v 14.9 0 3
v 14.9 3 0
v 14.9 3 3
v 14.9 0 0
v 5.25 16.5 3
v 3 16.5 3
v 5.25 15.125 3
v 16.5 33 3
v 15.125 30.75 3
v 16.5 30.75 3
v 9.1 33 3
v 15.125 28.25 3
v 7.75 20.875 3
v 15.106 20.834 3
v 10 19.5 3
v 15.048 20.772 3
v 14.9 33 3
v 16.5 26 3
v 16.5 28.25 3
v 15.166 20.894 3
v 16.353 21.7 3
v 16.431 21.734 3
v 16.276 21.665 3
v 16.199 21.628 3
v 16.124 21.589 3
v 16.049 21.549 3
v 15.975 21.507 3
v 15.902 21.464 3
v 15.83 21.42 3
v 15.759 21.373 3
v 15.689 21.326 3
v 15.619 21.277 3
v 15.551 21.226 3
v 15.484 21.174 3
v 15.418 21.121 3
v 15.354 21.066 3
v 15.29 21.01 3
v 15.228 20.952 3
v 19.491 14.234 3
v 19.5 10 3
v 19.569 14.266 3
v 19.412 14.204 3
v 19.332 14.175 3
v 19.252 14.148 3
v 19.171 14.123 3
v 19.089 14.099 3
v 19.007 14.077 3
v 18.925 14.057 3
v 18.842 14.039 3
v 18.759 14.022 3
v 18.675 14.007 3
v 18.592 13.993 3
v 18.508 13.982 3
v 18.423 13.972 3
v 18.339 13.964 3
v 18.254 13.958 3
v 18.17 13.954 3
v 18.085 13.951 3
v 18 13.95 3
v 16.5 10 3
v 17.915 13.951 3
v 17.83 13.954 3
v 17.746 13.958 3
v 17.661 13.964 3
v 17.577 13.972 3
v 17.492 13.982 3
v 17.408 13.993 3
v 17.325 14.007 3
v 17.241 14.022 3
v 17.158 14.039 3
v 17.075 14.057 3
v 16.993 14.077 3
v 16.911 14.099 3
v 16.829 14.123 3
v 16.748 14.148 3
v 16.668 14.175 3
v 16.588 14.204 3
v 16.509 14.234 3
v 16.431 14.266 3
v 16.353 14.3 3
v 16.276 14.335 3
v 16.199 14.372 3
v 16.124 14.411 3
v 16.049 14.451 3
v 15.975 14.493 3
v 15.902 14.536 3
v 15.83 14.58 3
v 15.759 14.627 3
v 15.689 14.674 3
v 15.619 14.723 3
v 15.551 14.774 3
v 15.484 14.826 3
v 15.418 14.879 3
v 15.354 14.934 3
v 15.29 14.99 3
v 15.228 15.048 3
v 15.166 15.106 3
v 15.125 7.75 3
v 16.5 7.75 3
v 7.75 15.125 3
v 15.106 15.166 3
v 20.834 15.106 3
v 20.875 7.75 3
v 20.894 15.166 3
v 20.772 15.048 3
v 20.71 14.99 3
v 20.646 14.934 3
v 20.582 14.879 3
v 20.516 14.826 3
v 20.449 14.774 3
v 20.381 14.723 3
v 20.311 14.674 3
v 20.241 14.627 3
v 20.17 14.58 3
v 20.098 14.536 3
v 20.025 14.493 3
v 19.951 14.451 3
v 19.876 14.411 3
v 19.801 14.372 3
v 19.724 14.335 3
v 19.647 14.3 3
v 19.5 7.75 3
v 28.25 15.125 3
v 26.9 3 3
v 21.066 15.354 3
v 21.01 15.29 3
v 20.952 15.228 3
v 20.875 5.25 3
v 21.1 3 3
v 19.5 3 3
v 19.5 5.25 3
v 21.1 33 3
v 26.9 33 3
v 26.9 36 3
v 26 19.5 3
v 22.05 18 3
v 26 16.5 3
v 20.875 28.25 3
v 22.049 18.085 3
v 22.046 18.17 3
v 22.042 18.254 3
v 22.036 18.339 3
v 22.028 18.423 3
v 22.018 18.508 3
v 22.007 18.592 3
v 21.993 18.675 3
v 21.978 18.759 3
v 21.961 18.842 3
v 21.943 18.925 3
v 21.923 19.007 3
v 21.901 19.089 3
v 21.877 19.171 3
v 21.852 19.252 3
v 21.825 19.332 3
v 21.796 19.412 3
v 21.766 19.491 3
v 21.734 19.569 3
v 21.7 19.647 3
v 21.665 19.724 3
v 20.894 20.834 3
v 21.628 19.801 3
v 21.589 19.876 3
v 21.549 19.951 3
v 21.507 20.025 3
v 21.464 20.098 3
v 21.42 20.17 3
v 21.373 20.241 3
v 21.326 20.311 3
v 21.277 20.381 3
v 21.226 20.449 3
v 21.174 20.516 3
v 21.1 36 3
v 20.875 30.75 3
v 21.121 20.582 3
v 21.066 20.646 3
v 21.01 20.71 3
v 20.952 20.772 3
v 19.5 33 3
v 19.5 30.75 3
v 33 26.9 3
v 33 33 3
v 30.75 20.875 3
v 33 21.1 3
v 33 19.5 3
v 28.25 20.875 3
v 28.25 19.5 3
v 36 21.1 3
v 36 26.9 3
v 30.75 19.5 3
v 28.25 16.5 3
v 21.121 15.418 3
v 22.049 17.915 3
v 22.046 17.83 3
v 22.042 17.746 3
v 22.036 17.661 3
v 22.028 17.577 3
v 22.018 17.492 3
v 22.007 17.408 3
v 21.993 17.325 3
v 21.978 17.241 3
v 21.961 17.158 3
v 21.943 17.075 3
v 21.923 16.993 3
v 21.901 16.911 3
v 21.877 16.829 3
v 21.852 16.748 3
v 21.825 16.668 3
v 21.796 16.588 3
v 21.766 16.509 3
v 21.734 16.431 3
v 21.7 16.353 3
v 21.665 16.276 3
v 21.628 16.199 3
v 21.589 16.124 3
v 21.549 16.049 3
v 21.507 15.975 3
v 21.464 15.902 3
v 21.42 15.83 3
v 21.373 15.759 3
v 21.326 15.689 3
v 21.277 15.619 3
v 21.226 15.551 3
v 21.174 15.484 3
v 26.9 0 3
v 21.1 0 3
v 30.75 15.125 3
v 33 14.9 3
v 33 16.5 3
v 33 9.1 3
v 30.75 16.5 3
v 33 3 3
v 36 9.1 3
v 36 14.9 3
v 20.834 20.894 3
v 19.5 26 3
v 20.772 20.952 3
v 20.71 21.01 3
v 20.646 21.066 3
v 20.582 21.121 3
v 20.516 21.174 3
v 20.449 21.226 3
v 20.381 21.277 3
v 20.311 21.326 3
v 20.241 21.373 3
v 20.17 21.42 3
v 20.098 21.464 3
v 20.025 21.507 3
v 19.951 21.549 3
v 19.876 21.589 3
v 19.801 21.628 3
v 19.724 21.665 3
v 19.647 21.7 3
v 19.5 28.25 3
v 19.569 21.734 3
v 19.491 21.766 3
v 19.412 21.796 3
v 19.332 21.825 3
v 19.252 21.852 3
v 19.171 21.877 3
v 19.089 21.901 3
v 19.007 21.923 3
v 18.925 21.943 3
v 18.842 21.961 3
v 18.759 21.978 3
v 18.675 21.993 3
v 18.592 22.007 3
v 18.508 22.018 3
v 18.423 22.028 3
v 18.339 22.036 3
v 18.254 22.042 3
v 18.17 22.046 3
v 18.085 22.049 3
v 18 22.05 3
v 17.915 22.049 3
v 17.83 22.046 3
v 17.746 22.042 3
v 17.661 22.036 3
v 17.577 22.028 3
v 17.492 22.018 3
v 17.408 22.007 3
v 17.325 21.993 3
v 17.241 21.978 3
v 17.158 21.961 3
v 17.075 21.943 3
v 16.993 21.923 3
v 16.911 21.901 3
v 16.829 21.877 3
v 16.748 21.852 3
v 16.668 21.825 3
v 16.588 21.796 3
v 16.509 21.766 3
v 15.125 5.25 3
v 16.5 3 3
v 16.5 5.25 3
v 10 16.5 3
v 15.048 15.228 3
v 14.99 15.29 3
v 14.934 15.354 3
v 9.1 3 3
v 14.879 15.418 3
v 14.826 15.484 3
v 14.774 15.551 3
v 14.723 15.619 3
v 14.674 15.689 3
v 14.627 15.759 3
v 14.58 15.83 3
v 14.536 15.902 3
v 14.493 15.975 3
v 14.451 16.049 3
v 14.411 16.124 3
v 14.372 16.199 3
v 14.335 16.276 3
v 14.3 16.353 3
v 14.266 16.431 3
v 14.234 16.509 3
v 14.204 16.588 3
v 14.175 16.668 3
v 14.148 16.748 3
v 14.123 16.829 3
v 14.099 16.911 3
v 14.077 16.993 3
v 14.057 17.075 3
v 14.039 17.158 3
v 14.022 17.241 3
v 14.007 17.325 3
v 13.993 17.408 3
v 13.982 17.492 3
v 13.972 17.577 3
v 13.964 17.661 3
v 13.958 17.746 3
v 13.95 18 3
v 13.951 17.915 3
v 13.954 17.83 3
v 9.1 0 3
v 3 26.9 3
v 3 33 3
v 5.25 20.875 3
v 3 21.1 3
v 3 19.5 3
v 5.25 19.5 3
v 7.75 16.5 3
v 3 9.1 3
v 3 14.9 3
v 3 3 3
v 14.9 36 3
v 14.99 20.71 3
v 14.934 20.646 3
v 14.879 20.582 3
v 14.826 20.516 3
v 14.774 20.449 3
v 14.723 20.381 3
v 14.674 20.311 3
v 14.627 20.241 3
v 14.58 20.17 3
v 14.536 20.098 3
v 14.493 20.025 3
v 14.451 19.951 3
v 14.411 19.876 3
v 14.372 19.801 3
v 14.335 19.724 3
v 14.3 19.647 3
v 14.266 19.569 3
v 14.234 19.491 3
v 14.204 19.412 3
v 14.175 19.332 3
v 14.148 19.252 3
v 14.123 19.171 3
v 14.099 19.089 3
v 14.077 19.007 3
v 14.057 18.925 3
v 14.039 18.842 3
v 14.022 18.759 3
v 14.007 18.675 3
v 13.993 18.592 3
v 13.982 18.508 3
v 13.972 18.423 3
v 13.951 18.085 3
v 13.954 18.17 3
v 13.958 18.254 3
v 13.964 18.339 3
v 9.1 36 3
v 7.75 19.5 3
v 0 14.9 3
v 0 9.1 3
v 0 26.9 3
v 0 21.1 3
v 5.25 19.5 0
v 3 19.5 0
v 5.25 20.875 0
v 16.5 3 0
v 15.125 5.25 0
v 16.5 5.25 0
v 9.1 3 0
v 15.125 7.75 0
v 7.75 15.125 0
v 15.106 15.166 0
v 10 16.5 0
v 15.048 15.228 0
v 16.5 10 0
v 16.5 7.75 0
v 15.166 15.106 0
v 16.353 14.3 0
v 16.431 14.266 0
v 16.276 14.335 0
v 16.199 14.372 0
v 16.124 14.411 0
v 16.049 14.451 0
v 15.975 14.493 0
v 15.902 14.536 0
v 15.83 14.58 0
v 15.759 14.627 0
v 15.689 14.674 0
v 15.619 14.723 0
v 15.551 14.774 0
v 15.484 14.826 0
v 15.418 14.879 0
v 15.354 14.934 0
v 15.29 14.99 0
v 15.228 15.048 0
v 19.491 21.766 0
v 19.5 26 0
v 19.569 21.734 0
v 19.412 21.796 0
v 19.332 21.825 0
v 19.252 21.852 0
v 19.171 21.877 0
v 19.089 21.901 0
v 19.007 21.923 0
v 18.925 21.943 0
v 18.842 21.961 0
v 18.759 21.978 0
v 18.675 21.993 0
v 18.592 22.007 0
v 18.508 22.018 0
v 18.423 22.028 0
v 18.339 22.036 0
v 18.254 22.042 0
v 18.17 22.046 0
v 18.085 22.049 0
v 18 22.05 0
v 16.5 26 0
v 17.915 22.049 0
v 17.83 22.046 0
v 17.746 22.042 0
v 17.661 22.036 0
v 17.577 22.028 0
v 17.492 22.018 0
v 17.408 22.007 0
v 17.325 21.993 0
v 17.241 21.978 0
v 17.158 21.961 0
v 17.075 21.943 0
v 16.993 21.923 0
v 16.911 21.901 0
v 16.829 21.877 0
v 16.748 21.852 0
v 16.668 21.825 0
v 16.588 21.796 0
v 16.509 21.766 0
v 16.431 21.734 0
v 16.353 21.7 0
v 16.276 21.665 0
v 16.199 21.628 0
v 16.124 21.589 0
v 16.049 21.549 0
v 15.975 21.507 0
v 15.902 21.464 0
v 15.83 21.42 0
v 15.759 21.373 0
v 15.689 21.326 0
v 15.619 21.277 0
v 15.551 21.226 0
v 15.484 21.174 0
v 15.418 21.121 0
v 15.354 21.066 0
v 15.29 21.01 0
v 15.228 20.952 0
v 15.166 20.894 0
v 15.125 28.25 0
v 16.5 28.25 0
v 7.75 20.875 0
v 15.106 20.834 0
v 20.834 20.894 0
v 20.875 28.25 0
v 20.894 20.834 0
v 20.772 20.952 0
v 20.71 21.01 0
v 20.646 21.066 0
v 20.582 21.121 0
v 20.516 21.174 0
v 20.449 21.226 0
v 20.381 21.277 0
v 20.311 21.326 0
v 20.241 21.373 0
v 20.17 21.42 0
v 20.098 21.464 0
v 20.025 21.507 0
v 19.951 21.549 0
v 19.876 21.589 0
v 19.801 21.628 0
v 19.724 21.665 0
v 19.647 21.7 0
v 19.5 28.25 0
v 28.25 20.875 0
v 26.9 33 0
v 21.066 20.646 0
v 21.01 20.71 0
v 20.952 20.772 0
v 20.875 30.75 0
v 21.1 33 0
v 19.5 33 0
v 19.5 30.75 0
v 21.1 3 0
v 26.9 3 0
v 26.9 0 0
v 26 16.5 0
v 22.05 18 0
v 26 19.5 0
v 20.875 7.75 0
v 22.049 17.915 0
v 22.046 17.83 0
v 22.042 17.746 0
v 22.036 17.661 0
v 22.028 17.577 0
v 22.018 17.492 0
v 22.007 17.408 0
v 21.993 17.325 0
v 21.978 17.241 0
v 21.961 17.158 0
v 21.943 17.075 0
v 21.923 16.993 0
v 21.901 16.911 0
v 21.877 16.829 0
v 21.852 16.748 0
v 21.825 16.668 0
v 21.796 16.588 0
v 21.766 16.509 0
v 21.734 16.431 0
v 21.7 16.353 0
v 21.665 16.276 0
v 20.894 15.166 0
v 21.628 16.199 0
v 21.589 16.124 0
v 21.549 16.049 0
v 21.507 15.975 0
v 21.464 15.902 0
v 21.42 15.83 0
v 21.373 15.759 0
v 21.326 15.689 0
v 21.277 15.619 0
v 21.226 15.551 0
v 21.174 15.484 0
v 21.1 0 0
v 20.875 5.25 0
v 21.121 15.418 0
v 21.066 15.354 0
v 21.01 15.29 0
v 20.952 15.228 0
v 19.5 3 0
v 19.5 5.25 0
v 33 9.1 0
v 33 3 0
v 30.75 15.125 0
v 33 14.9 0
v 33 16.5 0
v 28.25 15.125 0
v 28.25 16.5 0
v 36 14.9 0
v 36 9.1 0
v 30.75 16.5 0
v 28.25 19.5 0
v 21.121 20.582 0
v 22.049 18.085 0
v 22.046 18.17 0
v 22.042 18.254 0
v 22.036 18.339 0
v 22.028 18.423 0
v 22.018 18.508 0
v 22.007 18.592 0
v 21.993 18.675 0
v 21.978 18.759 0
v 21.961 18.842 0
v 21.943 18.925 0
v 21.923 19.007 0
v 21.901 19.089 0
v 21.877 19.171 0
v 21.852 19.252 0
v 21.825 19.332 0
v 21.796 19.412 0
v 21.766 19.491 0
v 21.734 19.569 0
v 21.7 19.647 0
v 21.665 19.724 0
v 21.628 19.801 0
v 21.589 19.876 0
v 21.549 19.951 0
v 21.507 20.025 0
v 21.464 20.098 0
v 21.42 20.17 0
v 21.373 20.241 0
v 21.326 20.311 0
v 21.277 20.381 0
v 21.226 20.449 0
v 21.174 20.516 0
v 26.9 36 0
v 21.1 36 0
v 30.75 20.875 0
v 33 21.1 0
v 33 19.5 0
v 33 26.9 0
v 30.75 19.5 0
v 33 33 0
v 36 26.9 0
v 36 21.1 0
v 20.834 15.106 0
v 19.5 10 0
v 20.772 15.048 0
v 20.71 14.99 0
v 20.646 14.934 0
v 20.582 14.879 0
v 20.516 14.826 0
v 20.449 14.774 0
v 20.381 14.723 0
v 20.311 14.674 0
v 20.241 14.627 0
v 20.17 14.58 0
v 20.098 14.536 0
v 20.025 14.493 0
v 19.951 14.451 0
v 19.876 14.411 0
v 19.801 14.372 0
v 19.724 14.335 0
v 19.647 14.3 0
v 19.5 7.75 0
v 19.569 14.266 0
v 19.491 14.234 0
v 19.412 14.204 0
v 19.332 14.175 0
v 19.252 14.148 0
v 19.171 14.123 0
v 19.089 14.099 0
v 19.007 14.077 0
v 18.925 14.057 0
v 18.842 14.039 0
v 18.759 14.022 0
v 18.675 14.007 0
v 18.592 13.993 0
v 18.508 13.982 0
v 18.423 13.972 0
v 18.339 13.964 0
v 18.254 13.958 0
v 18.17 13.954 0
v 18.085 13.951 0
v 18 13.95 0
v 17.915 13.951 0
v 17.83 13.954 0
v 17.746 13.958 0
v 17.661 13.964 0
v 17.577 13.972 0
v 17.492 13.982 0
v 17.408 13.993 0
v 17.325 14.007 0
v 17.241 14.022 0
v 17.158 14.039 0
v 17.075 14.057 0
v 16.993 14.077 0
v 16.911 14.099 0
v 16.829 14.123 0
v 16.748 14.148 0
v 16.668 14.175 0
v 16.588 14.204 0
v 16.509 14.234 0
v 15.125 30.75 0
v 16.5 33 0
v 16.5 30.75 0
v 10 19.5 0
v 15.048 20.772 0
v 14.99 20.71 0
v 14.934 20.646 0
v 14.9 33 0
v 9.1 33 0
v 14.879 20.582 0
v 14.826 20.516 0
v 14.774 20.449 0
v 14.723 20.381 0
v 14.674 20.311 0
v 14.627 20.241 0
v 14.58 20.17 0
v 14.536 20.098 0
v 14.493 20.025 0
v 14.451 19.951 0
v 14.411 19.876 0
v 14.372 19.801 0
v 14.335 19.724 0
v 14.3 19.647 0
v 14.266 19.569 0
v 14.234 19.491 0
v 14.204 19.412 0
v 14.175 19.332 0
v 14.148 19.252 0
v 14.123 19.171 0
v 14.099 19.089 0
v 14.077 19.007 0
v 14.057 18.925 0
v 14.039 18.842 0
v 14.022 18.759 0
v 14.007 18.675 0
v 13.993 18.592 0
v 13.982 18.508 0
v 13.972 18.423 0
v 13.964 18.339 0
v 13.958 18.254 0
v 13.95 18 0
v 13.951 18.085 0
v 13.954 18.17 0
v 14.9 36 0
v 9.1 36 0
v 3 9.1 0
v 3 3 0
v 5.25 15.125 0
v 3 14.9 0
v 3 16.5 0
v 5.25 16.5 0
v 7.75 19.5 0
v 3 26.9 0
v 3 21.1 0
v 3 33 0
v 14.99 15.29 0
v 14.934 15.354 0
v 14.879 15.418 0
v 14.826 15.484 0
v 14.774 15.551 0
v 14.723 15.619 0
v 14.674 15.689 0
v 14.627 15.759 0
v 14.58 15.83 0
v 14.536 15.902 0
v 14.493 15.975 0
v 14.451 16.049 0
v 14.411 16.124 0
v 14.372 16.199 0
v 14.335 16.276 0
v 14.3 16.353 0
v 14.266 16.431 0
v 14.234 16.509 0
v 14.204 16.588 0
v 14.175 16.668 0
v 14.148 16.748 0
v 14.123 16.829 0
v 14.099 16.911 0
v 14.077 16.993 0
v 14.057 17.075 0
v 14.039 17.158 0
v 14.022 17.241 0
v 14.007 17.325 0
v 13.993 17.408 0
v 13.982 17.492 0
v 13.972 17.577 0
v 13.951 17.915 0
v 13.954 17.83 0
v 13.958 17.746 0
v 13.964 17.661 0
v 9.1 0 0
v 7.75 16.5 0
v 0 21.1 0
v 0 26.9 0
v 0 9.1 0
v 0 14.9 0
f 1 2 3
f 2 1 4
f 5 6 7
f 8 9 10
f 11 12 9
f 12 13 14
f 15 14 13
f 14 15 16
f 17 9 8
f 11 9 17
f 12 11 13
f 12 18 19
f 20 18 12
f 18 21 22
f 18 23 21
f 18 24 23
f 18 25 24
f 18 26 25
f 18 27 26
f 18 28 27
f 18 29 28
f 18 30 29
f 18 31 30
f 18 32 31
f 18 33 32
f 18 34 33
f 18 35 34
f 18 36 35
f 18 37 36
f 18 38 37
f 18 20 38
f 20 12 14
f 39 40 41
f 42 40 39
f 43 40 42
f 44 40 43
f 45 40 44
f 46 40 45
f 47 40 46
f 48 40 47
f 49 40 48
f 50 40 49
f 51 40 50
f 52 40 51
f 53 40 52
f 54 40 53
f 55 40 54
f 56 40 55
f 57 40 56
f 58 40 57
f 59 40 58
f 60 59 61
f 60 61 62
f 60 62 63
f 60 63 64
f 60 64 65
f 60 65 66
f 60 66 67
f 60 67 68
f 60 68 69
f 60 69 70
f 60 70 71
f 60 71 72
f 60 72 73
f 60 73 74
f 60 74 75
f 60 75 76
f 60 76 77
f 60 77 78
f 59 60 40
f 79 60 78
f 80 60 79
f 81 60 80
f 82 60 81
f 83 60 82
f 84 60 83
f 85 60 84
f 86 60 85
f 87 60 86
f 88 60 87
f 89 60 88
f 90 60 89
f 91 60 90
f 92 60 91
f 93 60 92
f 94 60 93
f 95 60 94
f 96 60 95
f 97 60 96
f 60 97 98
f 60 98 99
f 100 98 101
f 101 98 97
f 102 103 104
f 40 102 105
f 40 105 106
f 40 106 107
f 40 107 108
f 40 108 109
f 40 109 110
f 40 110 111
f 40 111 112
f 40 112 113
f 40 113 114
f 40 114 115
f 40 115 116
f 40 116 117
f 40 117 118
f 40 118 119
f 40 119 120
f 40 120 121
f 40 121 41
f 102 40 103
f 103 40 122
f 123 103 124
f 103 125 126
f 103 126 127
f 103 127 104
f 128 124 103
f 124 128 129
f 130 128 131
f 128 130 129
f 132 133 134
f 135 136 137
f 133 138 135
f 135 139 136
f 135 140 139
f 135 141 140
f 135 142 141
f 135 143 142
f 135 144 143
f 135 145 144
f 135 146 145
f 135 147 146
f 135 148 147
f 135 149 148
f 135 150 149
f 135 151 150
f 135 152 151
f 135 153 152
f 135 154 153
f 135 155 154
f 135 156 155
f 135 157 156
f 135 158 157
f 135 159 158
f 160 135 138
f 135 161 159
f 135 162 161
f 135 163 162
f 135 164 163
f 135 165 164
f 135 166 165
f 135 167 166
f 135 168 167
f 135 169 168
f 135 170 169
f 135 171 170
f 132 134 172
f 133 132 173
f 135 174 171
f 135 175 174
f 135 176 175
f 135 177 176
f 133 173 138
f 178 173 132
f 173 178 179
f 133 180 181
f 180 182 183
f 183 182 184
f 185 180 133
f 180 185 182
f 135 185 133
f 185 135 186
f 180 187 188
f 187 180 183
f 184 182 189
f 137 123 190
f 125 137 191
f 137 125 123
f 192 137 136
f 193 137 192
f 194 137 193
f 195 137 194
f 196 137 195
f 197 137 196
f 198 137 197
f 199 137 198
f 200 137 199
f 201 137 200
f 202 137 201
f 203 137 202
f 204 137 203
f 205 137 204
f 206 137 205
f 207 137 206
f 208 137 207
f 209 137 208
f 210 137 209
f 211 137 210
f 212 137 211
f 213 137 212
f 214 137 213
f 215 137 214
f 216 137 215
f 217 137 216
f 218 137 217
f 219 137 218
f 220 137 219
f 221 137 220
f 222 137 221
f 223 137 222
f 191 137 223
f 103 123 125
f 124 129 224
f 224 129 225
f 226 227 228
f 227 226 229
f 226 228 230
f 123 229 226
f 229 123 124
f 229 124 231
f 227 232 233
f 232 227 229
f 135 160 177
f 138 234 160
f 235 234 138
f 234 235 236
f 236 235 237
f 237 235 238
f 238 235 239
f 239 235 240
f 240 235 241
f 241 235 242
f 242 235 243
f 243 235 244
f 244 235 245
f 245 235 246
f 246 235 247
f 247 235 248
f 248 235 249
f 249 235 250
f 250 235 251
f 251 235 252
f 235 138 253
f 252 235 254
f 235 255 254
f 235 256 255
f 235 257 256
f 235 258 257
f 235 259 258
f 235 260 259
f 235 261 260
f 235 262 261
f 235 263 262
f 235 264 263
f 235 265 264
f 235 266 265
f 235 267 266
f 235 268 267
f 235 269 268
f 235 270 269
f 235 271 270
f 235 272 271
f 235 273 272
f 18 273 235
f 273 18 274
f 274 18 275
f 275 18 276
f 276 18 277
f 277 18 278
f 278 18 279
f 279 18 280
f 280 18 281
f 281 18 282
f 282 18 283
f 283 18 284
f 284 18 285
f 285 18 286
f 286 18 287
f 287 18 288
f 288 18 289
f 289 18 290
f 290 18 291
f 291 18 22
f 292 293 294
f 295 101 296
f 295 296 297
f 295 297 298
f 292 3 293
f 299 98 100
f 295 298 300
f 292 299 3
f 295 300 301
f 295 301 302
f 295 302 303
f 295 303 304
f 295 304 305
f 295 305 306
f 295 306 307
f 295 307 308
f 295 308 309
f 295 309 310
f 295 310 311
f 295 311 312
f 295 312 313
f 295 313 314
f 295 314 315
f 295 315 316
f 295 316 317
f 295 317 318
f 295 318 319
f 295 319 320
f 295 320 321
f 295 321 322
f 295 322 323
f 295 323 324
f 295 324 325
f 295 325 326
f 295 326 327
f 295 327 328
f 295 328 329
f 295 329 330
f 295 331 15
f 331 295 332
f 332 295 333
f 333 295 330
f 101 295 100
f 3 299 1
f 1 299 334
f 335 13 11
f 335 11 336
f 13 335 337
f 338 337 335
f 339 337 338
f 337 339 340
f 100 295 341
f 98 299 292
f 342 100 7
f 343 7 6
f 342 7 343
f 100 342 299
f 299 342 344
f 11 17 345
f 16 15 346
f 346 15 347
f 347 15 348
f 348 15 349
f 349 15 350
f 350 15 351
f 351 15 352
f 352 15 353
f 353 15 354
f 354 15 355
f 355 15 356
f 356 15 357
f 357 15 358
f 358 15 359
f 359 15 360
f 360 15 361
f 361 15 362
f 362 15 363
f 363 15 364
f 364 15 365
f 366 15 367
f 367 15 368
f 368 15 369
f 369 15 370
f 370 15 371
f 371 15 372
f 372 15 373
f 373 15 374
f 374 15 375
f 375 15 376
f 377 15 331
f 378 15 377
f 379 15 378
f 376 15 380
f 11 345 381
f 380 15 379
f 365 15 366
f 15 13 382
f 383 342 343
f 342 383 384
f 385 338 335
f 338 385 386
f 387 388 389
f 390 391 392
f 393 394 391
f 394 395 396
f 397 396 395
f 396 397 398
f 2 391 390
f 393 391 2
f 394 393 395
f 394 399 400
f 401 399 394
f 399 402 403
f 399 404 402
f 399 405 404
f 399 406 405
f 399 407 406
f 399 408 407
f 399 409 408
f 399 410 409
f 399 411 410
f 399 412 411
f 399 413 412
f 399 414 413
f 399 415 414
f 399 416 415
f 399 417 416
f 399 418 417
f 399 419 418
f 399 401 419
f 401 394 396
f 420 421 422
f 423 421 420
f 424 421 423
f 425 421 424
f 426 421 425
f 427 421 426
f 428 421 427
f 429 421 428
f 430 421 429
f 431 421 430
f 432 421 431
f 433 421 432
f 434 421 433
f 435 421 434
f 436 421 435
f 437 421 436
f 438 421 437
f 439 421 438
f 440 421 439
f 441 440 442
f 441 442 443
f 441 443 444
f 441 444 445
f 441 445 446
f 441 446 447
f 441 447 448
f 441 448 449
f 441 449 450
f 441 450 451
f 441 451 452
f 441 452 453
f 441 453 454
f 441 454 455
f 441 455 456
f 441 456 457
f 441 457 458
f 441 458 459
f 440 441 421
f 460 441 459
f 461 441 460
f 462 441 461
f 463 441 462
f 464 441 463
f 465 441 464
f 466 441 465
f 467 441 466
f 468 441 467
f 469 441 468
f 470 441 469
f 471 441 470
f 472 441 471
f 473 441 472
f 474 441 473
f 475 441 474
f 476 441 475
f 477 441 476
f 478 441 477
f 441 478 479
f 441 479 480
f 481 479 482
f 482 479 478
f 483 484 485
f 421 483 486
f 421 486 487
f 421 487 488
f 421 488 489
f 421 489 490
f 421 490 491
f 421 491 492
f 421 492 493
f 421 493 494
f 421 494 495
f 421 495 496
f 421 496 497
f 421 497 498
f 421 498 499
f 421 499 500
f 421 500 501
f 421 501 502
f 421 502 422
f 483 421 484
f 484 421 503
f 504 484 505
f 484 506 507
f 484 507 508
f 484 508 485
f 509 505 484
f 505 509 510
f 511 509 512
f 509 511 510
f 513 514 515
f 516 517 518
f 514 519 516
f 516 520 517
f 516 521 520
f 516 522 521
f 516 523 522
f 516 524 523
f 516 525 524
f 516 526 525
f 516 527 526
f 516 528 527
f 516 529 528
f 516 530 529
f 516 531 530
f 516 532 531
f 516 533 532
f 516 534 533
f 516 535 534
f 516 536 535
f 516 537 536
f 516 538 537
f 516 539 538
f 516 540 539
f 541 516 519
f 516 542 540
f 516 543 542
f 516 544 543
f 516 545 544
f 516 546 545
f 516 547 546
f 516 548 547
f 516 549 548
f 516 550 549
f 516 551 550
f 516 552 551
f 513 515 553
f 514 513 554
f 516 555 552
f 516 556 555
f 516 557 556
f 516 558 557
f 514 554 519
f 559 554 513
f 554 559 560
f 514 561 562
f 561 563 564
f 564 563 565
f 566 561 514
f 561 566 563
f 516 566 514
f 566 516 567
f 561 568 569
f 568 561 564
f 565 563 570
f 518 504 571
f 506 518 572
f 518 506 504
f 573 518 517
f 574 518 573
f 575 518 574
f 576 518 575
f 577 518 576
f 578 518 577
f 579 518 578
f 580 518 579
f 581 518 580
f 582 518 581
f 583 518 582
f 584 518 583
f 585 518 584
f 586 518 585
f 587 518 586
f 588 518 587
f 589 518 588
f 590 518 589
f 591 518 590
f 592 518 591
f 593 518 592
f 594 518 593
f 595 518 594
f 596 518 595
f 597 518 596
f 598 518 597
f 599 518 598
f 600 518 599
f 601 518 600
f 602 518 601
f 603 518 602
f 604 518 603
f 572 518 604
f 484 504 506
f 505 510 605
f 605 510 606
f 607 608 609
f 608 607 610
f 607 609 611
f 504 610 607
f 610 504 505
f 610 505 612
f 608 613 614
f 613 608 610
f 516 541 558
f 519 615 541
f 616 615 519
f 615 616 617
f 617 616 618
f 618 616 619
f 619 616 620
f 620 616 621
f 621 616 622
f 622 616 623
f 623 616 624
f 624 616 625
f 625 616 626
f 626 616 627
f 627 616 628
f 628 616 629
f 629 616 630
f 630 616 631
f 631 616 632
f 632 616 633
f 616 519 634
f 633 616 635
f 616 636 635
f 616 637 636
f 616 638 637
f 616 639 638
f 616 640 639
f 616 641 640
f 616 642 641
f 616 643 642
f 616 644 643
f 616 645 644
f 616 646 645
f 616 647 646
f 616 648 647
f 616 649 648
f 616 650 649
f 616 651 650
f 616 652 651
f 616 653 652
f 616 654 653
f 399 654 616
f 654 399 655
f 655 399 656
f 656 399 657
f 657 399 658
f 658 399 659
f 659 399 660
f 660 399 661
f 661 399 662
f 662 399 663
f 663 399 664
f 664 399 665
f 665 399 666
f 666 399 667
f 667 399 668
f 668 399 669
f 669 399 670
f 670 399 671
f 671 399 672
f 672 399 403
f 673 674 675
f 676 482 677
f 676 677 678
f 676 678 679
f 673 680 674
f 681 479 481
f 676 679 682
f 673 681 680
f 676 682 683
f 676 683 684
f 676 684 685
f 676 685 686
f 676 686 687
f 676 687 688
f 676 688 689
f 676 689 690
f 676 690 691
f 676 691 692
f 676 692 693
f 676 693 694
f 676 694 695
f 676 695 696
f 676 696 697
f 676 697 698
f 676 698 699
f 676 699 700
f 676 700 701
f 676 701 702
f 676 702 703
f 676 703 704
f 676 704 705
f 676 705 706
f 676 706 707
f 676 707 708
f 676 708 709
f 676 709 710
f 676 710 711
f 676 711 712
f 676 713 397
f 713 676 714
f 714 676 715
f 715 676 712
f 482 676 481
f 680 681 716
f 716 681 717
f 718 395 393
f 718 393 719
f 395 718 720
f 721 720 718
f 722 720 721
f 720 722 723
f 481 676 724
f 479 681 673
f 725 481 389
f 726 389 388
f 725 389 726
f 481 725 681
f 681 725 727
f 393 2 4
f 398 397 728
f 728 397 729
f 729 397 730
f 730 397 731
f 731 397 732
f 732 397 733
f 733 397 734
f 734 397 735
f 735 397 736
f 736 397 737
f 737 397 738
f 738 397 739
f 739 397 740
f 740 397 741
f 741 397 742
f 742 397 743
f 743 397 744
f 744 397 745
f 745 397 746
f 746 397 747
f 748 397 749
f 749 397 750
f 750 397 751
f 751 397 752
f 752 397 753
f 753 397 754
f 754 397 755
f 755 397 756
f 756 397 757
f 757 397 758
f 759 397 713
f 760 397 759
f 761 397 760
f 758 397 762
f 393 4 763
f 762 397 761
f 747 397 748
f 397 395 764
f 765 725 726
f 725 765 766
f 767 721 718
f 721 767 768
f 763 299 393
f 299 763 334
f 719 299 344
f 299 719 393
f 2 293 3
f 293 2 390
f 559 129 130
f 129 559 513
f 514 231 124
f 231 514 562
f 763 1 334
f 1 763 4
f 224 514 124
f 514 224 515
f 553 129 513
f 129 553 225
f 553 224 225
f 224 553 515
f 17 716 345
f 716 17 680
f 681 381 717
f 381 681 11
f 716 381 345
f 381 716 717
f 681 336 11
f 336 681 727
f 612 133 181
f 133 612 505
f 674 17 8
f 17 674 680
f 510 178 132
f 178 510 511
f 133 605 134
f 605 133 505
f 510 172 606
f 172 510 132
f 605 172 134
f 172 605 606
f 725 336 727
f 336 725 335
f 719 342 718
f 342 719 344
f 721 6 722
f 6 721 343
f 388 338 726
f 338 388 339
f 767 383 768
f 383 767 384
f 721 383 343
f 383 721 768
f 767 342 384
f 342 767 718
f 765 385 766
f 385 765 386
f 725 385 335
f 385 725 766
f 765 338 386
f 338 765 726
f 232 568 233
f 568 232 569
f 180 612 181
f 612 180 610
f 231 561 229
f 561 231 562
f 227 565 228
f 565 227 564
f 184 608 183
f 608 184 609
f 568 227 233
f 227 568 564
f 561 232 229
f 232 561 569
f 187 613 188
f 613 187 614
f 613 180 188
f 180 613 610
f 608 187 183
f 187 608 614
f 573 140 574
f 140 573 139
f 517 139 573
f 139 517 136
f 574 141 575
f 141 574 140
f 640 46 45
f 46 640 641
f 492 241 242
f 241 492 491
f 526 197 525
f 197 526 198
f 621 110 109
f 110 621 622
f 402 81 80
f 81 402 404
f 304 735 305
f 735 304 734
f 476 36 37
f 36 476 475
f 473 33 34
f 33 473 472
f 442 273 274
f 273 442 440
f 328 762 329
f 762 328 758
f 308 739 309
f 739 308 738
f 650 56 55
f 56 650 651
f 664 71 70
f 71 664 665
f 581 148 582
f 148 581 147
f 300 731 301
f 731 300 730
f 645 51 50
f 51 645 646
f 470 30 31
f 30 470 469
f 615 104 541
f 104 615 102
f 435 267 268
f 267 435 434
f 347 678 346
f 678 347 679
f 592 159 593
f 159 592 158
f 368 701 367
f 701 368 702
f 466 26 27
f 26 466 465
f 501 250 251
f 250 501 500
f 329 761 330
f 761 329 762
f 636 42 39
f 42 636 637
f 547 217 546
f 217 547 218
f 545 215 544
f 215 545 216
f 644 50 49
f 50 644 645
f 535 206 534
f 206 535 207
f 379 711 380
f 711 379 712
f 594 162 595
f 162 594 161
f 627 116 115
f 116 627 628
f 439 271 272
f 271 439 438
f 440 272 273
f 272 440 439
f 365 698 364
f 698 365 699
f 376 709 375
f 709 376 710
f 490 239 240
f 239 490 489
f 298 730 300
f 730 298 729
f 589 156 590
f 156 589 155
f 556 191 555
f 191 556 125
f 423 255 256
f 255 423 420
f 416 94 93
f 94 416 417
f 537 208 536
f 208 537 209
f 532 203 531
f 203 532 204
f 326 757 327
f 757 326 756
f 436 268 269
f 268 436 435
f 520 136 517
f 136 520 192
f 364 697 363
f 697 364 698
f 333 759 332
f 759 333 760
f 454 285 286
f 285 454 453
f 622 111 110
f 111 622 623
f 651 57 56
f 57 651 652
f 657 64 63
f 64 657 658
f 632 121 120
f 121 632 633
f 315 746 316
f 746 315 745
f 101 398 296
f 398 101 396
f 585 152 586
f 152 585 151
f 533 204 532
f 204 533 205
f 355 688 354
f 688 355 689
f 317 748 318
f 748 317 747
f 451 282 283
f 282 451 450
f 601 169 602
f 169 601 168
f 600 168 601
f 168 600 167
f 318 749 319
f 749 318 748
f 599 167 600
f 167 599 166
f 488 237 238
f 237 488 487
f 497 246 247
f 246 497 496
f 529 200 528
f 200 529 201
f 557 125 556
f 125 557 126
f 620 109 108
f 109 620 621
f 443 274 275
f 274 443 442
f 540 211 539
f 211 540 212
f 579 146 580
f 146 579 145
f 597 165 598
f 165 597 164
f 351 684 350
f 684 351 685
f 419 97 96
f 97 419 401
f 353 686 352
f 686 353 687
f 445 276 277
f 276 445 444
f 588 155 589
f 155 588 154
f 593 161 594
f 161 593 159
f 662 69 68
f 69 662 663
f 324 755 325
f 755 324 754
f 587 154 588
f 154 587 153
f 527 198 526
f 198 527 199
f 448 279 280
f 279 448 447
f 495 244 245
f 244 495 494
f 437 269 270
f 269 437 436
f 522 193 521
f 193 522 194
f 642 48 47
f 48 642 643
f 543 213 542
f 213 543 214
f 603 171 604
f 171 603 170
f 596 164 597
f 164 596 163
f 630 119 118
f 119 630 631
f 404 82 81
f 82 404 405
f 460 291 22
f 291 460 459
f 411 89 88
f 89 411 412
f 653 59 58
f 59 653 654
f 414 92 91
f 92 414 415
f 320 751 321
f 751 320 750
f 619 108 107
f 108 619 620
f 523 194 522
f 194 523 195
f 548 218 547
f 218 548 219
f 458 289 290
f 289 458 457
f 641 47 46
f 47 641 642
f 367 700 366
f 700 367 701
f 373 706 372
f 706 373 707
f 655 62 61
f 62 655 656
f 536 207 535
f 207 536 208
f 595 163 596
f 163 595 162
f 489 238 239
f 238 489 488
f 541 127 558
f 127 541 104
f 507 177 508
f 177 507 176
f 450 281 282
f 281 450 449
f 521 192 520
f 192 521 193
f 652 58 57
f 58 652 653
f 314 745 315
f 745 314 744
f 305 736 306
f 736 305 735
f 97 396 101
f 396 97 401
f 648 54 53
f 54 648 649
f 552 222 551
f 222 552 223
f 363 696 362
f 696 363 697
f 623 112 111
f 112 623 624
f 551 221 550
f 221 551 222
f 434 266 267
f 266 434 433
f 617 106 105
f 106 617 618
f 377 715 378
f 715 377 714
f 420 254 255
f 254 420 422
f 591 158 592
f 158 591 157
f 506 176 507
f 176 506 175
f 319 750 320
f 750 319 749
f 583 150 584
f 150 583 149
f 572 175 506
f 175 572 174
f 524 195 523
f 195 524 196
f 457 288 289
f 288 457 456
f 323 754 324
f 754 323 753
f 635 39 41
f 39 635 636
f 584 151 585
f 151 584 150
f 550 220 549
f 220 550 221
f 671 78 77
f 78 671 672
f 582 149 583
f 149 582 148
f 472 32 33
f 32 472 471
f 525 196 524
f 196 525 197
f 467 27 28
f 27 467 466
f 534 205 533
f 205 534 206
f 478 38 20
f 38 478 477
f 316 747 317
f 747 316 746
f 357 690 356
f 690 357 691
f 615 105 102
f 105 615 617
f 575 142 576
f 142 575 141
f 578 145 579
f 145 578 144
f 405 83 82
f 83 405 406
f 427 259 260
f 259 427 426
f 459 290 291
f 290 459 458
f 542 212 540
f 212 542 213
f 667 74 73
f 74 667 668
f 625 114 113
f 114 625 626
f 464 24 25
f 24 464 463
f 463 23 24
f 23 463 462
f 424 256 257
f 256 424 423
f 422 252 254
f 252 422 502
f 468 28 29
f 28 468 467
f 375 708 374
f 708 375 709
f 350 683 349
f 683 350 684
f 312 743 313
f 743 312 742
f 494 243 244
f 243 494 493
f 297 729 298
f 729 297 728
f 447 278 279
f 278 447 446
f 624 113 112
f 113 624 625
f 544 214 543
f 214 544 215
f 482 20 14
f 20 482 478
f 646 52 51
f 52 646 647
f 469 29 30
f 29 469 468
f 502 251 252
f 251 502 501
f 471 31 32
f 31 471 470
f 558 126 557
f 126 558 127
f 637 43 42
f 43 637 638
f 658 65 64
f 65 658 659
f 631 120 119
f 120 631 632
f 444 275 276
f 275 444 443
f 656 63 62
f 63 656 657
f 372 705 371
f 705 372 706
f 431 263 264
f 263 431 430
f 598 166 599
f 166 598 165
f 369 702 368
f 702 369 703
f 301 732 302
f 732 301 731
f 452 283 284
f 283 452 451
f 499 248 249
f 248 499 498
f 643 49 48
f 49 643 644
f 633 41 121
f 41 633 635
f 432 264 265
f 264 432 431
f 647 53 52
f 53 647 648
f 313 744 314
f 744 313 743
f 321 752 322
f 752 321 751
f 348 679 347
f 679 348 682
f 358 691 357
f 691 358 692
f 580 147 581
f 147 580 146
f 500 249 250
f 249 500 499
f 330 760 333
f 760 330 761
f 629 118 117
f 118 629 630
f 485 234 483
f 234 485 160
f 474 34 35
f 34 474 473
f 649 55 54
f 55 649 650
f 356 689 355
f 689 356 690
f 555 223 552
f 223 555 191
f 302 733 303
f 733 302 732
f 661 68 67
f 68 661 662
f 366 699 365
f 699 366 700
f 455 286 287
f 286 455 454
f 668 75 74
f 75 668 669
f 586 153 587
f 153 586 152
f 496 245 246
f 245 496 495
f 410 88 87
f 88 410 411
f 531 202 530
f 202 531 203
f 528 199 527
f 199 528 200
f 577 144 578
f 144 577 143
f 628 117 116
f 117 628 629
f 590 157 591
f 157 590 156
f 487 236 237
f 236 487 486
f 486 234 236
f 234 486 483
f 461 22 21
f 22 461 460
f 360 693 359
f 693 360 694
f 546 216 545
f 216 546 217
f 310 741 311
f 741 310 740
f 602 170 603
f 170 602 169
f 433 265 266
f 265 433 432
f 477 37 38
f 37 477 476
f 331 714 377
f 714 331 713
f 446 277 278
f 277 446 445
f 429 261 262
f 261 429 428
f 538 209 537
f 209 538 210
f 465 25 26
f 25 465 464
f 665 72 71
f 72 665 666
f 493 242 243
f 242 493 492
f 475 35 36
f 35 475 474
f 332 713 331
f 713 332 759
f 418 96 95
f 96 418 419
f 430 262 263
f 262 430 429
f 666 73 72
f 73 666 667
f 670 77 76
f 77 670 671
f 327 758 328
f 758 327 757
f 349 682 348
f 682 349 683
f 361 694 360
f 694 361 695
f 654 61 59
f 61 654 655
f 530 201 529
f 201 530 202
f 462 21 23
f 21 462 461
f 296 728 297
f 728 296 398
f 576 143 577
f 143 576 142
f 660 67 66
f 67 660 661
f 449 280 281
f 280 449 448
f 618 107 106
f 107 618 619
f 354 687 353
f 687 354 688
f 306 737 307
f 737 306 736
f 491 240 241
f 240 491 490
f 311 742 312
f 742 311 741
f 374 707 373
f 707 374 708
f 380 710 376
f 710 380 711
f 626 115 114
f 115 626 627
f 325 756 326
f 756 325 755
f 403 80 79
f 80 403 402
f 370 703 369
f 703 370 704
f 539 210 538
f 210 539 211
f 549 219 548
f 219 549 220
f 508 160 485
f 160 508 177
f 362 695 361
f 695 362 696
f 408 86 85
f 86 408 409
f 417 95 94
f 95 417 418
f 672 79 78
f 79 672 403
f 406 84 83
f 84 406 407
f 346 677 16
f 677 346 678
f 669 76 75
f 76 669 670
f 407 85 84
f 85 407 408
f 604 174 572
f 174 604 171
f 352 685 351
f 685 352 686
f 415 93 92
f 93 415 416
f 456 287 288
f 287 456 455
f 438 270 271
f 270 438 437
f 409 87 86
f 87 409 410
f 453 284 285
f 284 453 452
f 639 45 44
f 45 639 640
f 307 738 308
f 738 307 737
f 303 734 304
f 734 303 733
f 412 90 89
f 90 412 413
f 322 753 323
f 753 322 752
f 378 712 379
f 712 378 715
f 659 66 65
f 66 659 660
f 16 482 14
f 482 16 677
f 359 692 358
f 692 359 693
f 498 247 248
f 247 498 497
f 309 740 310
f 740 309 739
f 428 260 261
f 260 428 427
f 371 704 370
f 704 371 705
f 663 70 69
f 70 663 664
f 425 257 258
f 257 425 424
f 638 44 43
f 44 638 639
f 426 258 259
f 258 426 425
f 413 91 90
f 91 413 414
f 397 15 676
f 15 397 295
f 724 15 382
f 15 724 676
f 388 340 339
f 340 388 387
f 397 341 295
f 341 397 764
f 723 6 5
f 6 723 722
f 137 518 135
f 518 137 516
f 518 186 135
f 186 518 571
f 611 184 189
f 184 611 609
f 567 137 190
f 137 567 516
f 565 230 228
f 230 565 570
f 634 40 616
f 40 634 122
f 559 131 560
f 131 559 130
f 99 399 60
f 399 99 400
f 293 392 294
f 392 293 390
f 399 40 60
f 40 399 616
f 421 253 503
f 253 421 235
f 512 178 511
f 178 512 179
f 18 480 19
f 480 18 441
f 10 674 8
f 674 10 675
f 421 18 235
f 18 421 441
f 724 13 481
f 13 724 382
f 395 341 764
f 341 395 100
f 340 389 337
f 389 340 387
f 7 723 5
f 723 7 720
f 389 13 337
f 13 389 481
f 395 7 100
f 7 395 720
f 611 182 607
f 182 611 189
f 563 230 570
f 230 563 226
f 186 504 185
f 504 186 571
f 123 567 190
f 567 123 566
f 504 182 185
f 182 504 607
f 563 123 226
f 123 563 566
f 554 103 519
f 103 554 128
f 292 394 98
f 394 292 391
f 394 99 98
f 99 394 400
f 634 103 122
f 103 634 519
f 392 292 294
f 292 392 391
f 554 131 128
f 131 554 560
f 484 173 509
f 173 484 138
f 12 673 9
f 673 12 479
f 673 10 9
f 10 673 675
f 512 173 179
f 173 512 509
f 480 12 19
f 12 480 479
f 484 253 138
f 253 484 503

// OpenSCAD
side = 36;
lct = 3 ; //laser cut sheet thickness
tol = .1; //tolerance
t_length = 10;// length of t-slot screw
t_thick = 3;// diameter of t-slot screw
nut_dia = 5.75;// diameter of t-slot nut
nut_thick = 2.5;// thickness of t-slot nut
dia = 8.1; //diameter of center hole
rch = dia/2; //radius of center hole

difference(){
union(){
     translate([lct,lct,0])cube([side-2*lct,side-2*lct,lct]);  //the center cube
     for(x=[lct+6+tol:12:side-lct-1])translate([x,0,0])cube([6-2*tol,lct,lct]); //bottom
     for(x=[lct+6+tol:12:side-lct-1])translate([x,side-lct,0])cube([6-2*tol,lct,lct]); //top
     for(y=[lct+6+tol:12:side-lct-1])translate([0,y,0])cube([lct,6-2*tol,lct]); //left
     for(y=[lct+6+tol:12:side-lct-1])translate([side-lct,y,0])cube([lct,6-2*tol,lct]);  //right
        }
union(){
    translate([side/2,side/2,0])cylinder(lct,r1=rch,r2=rch,center=false,$fn=300);//center hole
    
    translate([0,lct+12+((6-t_thick)/2),0])cube([t_length,t_thick,lct]);//screw-hole left
    
    translate([side-t_length,lct+12+((6-t_thick)/2),0])cube([t_length,t_thick,lct]);//screw-hole right
    
    translate([lct+12+((6-t_thick)/2),0,0])cube([t_thick,t_length,lct]);//screw-hole bottom
    
    translate([lct+12+((6-t_thick)/2),side-t_length,0])cube([t_thick,t_length,lct]);//screw-hole top
    
    translate([lct+((t_length-lct)-nut_thick)/2,(lct+12+((6-t_thick)/2))/*posn of t*/-((nut_dia-t_thick)/2),0])cube([nut_thick,nut_dia,lct]);//nut left
    
    translate([side-lct-((t_length-lct-nut_thick)/2)-nut_thick,(lct+12+((6-t_thick)/2))/*posn of t*/-((nut_dia-t_thick)/2),0])cube([nut_thick,nut_dia,lct]);//nut right
    
    translate([lct+12+(6-t_thick)/2-(nut_dia-t_thick)/2,lct+(t_length-lct-nut_thick)/2,0])cube([nut_dia,nut_thick,lct]);//nut bottom
    
    translate([lct+12+(6-t_thick)/2-(nut_dia-t_thick)/2,side-lct-((t_length-lct-nut_thick)/2)-nut_thick,0])cube([nut_dia,nut_thick,lct]);//nut top
    }
}
